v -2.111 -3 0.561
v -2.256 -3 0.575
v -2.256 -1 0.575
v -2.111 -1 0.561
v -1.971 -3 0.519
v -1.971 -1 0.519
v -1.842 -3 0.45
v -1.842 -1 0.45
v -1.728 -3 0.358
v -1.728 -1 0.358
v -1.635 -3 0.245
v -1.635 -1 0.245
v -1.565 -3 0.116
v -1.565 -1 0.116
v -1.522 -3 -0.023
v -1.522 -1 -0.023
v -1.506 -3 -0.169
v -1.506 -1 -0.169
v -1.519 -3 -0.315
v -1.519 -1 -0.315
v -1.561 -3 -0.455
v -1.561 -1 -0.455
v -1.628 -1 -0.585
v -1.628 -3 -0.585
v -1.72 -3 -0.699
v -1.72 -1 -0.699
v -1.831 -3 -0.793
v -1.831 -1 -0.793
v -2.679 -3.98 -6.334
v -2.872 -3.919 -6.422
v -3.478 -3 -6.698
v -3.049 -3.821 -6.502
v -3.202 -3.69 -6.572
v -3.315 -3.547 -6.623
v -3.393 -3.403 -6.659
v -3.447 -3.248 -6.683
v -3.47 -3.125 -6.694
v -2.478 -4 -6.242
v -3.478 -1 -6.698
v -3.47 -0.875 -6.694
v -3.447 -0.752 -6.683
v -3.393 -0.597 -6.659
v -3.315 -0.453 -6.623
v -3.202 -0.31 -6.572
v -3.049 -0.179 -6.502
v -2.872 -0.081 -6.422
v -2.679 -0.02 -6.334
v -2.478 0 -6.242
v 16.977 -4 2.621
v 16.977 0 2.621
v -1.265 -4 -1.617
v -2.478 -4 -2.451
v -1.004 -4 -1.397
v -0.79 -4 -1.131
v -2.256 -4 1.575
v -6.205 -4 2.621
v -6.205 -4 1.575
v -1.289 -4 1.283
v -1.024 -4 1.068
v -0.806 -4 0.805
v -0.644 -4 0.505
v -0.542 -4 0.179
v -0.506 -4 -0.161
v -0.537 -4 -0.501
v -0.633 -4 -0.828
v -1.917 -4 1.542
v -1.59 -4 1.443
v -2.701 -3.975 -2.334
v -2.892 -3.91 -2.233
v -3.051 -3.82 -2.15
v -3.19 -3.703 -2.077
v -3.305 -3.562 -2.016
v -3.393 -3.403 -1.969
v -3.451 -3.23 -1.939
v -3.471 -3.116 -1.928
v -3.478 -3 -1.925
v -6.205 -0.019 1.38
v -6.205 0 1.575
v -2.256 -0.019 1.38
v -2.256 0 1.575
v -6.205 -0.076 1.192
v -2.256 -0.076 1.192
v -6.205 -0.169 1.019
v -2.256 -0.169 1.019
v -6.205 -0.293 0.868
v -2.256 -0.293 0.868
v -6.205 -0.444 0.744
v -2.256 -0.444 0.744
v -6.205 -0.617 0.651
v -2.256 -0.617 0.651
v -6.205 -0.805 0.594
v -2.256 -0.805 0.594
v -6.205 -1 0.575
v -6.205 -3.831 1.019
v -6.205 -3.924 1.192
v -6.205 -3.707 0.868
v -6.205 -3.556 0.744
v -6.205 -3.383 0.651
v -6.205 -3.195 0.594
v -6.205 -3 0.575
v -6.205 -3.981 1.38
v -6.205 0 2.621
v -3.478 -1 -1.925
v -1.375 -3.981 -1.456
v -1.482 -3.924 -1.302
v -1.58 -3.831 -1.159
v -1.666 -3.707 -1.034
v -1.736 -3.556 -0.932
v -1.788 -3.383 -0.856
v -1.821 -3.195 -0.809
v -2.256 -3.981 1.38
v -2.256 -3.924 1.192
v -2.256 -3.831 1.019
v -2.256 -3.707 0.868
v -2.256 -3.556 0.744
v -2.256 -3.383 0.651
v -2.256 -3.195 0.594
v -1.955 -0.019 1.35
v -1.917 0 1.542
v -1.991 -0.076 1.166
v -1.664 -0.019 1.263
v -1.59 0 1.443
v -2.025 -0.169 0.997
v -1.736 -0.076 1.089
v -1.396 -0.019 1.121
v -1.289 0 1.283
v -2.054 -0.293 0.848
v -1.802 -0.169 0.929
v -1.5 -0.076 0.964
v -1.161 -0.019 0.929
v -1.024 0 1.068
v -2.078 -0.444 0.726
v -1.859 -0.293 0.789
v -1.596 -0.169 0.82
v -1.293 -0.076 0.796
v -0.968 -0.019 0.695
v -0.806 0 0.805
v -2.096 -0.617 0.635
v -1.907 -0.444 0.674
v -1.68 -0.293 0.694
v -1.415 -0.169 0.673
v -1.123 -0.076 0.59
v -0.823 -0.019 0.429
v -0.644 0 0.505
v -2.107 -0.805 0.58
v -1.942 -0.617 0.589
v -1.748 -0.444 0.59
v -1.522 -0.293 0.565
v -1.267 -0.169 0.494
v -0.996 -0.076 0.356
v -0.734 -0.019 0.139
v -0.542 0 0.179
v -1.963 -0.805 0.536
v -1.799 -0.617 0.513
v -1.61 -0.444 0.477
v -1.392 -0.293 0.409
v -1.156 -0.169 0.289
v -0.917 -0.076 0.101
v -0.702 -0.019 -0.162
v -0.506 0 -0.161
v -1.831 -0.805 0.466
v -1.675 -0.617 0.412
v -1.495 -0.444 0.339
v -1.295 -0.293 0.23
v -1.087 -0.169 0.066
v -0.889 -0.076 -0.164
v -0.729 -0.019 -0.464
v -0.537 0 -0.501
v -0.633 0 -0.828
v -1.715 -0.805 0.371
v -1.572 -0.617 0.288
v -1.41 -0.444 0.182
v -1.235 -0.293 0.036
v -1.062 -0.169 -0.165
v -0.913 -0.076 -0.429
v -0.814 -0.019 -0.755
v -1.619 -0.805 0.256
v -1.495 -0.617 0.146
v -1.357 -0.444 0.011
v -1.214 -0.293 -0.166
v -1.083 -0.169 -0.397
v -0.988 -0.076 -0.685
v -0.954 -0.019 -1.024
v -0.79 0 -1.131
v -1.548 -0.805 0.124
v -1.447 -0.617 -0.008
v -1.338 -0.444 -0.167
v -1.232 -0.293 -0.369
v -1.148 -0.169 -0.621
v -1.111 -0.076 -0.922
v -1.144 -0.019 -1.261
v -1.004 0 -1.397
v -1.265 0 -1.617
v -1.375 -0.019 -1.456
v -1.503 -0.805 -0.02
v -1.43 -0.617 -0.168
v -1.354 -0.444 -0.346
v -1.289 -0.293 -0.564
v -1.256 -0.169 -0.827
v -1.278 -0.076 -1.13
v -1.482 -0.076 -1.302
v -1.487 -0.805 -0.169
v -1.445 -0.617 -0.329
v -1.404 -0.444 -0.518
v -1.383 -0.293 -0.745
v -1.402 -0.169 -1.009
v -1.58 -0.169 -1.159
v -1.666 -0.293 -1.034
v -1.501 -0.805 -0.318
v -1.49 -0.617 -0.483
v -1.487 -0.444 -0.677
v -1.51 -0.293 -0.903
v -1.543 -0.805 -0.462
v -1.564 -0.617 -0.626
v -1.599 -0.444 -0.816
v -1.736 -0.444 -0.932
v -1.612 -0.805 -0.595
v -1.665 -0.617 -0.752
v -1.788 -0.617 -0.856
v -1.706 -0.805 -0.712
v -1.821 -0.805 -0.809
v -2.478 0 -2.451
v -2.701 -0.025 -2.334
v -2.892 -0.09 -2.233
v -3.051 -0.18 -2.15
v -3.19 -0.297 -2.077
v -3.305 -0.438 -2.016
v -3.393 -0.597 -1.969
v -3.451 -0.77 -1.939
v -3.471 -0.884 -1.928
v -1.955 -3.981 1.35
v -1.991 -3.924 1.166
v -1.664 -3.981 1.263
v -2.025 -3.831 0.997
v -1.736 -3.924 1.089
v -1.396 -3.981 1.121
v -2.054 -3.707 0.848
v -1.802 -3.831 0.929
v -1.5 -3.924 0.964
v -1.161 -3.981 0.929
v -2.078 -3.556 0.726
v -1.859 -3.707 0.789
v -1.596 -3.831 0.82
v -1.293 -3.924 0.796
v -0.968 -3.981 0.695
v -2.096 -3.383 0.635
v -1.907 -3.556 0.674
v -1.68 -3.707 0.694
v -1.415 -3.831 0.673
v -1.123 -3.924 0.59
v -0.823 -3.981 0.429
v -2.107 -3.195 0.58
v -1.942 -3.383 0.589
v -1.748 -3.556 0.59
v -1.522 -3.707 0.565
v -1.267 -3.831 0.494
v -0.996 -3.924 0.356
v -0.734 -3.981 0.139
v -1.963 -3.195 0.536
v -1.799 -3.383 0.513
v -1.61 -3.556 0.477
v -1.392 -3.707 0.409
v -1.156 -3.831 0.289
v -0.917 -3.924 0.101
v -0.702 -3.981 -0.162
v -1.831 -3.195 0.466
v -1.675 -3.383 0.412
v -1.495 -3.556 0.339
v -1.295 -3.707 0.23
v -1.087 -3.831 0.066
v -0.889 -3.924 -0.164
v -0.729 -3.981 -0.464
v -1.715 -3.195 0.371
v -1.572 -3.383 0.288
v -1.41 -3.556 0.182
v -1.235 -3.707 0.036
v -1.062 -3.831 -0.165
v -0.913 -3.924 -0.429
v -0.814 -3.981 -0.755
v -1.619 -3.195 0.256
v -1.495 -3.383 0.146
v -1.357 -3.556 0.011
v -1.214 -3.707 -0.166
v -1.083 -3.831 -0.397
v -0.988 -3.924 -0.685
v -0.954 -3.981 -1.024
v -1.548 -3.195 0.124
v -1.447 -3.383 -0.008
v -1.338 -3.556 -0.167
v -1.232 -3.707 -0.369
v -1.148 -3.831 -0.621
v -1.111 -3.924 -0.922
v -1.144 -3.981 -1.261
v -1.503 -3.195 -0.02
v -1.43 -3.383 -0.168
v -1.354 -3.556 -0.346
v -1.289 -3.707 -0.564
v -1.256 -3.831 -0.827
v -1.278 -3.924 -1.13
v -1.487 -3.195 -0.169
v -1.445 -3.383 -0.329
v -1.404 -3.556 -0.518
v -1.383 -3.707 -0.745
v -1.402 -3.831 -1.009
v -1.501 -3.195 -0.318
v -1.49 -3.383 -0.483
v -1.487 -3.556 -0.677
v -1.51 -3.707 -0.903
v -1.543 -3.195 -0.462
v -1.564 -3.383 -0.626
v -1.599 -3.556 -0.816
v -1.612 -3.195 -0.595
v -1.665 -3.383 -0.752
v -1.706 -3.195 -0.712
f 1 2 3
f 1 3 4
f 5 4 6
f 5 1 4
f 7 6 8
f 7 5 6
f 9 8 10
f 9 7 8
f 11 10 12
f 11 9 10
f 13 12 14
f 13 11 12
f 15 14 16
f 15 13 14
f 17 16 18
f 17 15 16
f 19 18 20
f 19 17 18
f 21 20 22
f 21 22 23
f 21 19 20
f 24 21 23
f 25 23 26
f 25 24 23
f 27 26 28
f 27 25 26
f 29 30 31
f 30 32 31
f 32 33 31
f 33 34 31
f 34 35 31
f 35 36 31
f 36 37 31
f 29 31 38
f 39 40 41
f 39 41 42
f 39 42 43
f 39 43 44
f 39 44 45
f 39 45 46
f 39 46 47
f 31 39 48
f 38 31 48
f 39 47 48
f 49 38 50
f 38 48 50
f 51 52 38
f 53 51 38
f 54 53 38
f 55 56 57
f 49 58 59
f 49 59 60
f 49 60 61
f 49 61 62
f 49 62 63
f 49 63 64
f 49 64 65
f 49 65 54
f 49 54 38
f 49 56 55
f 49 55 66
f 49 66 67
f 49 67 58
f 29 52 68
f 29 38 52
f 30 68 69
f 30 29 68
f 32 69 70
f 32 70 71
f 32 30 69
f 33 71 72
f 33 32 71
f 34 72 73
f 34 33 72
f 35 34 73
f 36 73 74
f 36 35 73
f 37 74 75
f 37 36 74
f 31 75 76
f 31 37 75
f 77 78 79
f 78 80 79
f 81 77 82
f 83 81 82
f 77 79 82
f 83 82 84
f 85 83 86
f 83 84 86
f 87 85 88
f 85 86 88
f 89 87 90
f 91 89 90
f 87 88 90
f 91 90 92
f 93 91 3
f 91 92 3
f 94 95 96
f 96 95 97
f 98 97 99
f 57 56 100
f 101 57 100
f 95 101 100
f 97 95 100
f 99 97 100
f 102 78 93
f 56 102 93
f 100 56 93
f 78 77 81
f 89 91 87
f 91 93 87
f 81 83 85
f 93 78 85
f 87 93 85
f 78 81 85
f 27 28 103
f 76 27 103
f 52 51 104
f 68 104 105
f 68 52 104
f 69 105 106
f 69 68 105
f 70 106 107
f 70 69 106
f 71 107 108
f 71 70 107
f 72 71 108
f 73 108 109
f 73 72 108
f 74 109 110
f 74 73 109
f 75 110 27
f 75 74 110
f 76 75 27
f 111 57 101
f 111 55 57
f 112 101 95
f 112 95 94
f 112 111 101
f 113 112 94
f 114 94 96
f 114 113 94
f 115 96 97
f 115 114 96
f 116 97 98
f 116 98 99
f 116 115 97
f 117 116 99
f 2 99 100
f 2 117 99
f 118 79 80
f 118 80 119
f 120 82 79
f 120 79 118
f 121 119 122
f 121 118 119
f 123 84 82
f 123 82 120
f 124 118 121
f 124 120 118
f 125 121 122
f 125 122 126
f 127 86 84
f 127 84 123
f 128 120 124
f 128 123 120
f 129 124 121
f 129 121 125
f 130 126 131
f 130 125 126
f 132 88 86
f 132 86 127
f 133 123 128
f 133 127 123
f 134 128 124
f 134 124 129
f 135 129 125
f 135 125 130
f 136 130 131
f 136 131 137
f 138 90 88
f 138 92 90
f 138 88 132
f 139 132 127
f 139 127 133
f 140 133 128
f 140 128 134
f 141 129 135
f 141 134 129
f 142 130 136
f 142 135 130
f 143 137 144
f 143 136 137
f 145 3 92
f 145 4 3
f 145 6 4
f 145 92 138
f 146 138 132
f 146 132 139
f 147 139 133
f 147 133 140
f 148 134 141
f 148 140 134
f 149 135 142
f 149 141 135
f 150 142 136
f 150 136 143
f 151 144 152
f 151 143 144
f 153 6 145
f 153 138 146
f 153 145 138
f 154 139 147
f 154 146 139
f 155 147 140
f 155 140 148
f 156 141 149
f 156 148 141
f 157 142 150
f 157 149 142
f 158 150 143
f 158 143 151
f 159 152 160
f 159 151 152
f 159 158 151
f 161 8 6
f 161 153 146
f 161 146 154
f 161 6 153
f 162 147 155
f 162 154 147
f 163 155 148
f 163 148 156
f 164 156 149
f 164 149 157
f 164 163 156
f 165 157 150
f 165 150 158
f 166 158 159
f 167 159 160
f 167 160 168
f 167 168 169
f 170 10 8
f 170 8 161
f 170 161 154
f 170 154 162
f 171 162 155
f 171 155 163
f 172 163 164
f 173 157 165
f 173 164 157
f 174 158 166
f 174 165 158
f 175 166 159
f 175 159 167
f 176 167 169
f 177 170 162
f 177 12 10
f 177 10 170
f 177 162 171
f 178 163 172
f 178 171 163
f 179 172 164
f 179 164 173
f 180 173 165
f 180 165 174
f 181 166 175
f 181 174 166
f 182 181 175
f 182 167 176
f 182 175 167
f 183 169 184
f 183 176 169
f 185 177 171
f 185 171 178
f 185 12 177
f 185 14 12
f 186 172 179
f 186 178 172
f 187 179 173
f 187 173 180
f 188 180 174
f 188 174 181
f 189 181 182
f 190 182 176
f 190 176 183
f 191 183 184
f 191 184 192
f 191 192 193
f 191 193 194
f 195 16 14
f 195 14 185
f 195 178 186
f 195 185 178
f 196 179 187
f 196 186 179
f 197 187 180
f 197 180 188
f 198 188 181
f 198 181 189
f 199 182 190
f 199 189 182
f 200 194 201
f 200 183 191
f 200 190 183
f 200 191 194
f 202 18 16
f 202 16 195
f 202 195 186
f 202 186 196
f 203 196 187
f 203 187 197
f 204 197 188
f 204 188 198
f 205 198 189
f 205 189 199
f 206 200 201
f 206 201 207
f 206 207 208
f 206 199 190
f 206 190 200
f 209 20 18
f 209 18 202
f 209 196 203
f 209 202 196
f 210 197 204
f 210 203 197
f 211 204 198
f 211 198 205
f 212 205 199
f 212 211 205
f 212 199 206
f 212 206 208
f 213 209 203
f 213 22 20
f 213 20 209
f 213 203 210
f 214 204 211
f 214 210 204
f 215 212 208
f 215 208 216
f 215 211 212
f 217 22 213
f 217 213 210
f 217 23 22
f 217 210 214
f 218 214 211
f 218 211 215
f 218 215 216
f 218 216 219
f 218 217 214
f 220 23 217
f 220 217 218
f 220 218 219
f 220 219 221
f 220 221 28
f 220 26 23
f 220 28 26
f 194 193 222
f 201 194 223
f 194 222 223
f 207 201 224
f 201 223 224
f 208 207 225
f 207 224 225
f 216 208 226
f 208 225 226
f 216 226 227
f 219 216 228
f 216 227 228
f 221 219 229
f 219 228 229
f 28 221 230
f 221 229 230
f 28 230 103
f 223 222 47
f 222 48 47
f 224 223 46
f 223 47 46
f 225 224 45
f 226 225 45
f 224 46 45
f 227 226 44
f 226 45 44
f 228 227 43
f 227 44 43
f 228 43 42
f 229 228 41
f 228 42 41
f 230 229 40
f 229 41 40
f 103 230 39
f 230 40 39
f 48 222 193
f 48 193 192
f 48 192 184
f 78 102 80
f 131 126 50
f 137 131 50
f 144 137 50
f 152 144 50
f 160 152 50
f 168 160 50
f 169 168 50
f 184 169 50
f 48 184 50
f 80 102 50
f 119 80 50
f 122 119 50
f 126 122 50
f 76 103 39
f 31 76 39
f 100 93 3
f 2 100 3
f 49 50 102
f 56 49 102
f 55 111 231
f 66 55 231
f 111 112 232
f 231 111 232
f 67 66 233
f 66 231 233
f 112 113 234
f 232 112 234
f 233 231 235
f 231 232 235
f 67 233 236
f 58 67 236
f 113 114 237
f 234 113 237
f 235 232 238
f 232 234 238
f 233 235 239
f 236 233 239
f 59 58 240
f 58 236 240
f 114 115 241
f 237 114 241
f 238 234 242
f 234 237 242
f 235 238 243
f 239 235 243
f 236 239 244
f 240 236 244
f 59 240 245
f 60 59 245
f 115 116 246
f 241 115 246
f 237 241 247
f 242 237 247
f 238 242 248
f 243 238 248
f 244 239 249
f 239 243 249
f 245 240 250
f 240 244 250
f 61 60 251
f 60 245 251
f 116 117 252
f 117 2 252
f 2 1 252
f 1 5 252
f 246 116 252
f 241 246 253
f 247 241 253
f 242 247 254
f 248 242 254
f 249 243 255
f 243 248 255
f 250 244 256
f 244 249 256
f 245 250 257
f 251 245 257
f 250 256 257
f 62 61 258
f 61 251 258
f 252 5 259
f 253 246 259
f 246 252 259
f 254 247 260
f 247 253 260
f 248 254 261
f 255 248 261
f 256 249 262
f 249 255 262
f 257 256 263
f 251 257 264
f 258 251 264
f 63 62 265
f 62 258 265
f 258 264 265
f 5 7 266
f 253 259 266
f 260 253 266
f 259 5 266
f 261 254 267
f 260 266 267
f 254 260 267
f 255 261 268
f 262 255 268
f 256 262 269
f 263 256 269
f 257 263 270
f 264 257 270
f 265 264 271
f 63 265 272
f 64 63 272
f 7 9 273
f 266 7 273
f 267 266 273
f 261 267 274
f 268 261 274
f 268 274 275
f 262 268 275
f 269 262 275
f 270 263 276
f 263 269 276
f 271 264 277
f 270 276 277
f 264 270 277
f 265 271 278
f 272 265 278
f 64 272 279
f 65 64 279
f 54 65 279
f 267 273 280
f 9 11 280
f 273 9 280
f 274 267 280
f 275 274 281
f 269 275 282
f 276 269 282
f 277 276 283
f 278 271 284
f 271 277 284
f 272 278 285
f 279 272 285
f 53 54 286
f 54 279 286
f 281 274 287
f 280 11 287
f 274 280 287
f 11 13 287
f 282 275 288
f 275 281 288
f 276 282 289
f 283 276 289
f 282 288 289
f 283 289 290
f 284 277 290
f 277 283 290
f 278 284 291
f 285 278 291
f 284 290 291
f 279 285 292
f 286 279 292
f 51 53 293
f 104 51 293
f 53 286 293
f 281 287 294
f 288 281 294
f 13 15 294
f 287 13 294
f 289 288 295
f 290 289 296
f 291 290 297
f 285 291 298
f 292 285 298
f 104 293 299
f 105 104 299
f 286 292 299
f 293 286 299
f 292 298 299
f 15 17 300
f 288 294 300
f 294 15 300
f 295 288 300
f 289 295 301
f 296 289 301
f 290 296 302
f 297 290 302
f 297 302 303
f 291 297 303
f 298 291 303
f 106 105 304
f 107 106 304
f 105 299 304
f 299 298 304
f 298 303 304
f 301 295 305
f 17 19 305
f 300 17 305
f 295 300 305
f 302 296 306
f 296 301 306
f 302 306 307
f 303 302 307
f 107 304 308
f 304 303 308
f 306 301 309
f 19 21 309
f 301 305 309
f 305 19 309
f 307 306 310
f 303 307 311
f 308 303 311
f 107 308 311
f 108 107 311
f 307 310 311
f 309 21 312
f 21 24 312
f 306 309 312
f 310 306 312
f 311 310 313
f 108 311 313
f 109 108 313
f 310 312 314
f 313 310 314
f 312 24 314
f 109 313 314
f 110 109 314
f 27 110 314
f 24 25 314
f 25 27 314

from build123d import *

# Parameters (mm, degrees)
F1_DEPTH = 4
F2_R     = 0.75
F3_R     = 1


with BuildPart() as f1:
    # F0 (on Front) → F1 (new body)
    with BuildSketch(Plane.XZ):
        Polygon((-3.4779643061, -6.6976709247), (16.9765876419, 2.6205155937), (-6.205236799, 2.6205155937), (-6.205236799, 0.575057485), (0.1584017682, 0.575057485), (-3.4779643061, -1.924942515), align=None)
    extrude(amount=F1_DEPTH)

    # F2
    f2_edges = [f1.edges().sort_by_distance(p)[0] for p in [
        (0.158402, -2, 0.575057),
    ]]
    fillet(f2_edges, radius=F2_R)

    # F3
    f3_edges = [f1.edges().sort_by_distance(p)[0] for p in [
        (-3.477964, -4, -4.311307),
        (-2.654714, -4, -1.358958),
        (-3.477964, 0, -4.311307),
        (-1.540112, 0, 0.047517),
    ]]
    fillet(f3_edges, radius=F3_R)


solid = f1.part
